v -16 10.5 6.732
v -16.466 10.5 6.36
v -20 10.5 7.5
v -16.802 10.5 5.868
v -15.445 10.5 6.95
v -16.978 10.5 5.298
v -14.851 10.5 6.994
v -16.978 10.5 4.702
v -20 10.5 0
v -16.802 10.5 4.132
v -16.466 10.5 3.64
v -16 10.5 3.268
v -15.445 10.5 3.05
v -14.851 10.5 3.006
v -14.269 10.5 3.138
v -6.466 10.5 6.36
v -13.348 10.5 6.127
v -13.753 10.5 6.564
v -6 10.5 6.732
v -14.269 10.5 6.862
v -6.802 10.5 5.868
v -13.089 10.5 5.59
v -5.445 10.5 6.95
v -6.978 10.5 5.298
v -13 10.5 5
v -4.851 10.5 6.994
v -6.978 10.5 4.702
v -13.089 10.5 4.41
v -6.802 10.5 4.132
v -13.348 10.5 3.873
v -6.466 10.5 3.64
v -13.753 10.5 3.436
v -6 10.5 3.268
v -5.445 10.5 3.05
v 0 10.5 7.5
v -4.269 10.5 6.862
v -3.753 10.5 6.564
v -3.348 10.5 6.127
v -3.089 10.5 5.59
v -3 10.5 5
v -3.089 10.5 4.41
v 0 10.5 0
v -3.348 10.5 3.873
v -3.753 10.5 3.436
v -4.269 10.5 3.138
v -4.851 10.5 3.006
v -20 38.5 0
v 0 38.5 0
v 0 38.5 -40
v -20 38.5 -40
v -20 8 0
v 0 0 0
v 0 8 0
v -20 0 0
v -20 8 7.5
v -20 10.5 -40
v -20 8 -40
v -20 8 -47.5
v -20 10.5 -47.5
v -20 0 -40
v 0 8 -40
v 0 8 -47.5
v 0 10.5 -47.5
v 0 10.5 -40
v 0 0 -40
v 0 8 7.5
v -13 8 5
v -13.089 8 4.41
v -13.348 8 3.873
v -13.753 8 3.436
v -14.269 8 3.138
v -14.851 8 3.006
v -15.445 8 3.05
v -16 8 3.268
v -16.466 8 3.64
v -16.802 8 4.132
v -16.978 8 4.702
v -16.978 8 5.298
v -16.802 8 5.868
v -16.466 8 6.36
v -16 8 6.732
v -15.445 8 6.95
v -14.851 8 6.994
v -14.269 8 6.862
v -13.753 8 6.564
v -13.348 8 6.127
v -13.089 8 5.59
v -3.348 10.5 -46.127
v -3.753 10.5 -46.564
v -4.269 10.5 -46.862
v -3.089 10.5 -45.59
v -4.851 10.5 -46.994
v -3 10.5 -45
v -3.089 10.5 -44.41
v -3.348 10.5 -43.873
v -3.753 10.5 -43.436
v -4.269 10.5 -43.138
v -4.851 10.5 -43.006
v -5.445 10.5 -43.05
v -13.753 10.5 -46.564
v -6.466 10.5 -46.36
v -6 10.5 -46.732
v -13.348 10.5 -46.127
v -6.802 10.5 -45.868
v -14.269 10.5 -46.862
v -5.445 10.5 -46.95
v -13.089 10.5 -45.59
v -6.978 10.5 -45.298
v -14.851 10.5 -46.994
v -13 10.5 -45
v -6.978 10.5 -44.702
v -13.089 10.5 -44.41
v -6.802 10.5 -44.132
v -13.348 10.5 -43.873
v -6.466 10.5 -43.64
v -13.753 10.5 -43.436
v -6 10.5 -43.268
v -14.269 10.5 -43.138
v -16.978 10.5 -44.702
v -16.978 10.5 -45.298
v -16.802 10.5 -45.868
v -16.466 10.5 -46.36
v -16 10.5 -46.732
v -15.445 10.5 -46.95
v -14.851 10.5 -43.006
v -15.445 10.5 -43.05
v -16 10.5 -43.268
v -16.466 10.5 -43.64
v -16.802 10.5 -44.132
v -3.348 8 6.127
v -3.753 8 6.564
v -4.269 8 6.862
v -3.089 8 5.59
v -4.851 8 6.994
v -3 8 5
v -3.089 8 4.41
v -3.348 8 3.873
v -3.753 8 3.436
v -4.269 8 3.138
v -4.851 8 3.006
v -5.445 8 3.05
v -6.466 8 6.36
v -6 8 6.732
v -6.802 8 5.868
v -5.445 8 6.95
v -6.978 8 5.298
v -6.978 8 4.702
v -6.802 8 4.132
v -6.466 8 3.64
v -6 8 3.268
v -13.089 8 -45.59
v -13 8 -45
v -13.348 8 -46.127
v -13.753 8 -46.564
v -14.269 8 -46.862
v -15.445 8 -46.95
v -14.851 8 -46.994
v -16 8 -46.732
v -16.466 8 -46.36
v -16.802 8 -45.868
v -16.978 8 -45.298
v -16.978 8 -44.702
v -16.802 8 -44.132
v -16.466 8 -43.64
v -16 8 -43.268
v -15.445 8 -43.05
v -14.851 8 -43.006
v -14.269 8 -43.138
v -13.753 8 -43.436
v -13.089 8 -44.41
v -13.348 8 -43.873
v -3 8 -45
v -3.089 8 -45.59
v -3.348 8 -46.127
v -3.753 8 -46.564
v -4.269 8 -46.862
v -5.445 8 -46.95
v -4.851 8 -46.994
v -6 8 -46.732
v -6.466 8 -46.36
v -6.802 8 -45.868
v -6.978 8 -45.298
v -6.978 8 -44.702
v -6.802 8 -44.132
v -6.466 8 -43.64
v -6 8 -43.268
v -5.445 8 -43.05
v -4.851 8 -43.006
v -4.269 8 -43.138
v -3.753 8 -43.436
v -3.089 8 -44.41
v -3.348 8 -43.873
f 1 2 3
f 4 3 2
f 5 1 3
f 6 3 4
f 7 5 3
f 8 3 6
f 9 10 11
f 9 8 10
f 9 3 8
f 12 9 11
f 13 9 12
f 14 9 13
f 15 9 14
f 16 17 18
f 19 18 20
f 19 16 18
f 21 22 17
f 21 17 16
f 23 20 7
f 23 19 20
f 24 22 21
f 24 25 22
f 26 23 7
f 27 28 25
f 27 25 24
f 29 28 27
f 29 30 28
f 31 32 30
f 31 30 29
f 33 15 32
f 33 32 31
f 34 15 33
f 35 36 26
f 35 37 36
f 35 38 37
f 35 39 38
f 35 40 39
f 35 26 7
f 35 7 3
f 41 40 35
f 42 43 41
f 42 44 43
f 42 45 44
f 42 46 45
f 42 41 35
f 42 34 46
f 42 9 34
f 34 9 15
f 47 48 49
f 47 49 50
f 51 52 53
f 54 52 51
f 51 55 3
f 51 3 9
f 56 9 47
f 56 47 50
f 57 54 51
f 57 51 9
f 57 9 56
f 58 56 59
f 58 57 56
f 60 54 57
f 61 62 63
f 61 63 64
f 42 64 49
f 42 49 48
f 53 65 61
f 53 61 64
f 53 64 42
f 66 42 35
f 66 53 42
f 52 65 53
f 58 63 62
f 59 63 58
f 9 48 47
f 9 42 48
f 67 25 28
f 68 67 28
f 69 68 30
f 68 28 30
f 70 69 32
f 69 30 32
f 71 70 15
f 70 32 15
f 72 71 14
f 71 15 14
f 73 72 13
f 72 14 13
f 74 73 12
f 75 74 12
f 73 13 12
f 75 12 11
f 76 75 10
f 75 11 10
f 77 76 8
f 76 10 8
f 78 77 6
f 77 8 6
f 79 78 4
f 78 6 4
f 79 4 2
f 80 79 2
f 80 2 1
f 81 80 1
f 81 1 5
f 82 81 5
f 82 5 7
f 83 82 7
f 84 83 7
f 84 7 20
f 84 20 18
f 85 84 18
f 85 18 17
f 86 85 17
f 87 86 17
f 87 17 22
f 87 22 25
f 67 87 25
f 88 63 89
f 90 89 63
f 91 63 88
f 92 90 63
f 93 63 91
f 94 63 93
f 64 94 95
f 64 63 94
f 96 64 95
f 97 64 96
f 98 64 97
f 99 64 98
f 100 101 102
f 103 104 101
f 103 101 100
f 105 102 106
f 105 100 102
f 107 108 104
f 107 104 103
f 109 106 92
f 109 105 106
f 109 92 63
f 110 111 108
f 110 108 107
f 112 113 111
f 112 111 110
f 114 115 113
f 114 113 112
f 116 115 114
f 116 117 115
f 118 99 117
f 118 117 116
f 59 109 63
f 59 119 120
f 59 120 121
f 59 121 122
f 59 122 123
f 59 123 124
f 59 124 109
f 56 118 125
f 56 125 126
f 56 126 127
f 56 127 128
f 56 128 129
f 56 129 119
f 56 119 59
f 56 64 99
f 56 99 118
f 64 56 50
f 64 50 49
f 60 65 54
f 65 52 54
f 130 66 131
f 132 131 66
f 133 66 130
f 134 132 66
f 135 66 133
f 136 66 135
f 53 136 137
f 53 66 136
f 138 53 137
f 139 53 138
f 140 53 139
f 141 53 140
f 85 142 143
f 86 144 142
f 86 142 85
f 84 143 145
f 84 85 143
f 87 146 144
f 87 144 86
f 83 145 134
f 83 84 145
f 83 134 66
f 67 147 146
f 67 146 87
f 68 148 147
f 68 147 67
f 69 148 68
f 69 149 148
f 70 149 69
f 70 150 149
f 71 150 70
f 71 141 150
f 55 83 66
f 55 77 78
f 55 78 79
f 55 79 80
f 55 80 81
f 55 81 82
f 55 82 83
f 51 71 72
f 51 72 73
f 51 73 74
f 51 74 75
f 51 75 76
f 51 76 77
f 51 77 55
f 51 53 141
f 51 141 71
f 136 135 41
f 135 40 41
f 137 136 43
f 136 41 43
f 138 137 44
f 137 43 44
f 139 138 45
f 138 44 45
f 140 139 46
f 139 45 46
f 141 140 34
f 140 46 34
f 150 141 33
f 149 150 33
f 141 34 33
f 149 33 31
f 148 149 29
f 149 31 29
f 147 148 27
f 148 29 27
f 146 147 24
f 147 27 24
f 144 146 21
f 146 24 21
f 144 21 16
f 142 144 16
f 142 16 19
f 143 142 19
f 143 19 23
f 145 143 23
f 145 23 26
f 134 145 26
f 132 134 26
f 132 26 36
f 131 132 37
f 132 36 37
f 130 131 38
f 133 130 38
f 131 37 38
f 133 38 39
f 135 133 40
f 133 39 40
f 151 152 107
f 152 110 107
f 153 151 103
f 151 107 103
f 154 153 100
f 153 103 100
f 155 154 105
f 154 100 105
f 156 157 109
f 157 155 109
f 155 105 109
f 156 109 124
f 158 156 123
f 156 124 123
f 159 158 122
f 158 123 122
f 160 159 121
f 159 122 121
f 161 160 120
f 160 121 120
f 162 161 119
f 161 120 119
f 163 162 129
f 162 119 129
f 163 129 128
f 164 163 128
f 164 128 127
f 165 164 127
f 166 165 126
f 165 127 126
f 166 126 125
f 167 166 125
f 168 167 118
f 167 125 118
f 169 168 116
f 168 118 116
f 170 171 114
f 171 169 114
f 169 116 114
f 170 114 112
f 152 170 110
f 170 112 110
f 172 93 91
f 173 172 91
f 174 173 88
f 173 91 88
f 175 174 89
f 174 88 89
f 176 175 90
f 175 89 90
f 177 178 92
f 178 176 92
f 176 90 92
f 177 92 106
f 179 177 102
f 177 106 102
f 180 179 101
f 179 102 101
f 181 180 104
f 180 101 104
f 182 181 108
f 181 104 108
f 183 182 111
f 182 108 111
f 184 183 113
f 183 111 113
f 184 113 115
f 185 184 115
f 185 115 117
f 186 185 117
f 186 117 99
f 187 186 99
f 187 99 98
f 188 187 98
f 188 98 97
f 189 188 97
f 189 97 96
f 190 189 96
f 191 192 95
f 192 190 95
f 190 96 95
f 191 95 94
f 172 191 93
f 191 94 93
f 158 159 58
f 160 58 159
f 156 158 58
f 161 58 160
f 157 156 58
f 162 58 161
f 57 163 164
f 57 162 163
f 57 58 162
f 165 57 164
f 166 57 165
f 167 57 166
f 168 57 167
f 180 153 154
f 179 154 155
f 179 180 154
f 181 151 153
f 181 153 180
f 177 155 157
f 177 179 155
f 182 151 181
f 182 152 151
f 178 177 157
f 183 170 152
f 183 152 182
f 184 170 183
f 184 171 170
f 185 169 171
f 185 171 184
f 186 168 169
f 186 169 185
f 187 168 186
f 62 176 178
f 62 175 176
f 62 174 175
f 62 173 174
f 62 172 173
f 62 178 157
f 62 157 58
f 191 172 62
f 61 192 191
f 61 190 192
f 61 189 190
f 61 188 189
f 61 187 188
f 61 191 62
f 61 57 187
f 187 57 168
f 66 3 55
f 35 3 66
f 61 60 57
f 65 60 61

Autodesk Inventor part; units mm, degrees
ref_plane "YZ Plane" through (0, 0, 0) normal (1, 0, 0) x (0, 1, 0)
ref_plane "XZ Plane" through (0, 0, 0) normal (0, 1, 0) x (-1, 0, 0)
ref_plane "XY Plane" through (0, 0, 0) normal (0, 0, 1) x (1, 0, 0)
sketch "Sketch4" plane through (0, 0, 0) normal (0, 1, 0) x (-1, 0, 0)
  line L0 (0, 0) -> (20, 0)
  line L1 (20, 0) -> (20, -20)
  line L2 (20, -20) -> (0, -20)
  line L3 (0, -20) -> (0, 0)
  dimension "d16" = 20
  dimension "d17" = 20
extrude "Extrusion4" add sketch "Sketch4" along normal blind 38.5
sketch "Sketch5" plane through (-20, 0, 0) normal (0, 0, 1) x (1, 0, 0)
  line L0 (0, 0) -> (0, 38.5) projected
  line L1 (20, 0) -> (20, 38.5) projected
  line L2 (0, 10.5) -> (20, 10.5)
  line L3 (20, 10.5) -> (20, 8)
  line L4 (20, 8) -> (0, 8)
  line L5 (0, 8) -> (0, 10.5)
  dimension "d20" = 2.5
  dimension "d21" = 8
extrude "Extrusion5" add sketch "Sketch5" along normal blind 7.5
sketch "Sketch6" plane through (-20, 10.5, 0) normal (0, 1, 0) x (1, 0, 0)
  circle A0 centre (5, -5) radius 2
  circle A1 centre (15, -5) radius 2
  line L0 (0, 0) -> (20, 0) projected
  line L1 (0, 0) -> (0, -7.5) projected
  line L2 (20, 0) -> (20, -7.5) projected
  dimension "d24" = 4
  dimension "d25" = 4
  dimension "d26" = 5
  dimension "d27" = 5
  dimension "d28" = 5
  dimension "d29" = 5
extrude "Extrusion6" cut sketch "Sketch6" against normal through all
mirror "Mirror1" about plane through (0, 0, -20) normal (0, 0, -1)
properties part number "servo"
